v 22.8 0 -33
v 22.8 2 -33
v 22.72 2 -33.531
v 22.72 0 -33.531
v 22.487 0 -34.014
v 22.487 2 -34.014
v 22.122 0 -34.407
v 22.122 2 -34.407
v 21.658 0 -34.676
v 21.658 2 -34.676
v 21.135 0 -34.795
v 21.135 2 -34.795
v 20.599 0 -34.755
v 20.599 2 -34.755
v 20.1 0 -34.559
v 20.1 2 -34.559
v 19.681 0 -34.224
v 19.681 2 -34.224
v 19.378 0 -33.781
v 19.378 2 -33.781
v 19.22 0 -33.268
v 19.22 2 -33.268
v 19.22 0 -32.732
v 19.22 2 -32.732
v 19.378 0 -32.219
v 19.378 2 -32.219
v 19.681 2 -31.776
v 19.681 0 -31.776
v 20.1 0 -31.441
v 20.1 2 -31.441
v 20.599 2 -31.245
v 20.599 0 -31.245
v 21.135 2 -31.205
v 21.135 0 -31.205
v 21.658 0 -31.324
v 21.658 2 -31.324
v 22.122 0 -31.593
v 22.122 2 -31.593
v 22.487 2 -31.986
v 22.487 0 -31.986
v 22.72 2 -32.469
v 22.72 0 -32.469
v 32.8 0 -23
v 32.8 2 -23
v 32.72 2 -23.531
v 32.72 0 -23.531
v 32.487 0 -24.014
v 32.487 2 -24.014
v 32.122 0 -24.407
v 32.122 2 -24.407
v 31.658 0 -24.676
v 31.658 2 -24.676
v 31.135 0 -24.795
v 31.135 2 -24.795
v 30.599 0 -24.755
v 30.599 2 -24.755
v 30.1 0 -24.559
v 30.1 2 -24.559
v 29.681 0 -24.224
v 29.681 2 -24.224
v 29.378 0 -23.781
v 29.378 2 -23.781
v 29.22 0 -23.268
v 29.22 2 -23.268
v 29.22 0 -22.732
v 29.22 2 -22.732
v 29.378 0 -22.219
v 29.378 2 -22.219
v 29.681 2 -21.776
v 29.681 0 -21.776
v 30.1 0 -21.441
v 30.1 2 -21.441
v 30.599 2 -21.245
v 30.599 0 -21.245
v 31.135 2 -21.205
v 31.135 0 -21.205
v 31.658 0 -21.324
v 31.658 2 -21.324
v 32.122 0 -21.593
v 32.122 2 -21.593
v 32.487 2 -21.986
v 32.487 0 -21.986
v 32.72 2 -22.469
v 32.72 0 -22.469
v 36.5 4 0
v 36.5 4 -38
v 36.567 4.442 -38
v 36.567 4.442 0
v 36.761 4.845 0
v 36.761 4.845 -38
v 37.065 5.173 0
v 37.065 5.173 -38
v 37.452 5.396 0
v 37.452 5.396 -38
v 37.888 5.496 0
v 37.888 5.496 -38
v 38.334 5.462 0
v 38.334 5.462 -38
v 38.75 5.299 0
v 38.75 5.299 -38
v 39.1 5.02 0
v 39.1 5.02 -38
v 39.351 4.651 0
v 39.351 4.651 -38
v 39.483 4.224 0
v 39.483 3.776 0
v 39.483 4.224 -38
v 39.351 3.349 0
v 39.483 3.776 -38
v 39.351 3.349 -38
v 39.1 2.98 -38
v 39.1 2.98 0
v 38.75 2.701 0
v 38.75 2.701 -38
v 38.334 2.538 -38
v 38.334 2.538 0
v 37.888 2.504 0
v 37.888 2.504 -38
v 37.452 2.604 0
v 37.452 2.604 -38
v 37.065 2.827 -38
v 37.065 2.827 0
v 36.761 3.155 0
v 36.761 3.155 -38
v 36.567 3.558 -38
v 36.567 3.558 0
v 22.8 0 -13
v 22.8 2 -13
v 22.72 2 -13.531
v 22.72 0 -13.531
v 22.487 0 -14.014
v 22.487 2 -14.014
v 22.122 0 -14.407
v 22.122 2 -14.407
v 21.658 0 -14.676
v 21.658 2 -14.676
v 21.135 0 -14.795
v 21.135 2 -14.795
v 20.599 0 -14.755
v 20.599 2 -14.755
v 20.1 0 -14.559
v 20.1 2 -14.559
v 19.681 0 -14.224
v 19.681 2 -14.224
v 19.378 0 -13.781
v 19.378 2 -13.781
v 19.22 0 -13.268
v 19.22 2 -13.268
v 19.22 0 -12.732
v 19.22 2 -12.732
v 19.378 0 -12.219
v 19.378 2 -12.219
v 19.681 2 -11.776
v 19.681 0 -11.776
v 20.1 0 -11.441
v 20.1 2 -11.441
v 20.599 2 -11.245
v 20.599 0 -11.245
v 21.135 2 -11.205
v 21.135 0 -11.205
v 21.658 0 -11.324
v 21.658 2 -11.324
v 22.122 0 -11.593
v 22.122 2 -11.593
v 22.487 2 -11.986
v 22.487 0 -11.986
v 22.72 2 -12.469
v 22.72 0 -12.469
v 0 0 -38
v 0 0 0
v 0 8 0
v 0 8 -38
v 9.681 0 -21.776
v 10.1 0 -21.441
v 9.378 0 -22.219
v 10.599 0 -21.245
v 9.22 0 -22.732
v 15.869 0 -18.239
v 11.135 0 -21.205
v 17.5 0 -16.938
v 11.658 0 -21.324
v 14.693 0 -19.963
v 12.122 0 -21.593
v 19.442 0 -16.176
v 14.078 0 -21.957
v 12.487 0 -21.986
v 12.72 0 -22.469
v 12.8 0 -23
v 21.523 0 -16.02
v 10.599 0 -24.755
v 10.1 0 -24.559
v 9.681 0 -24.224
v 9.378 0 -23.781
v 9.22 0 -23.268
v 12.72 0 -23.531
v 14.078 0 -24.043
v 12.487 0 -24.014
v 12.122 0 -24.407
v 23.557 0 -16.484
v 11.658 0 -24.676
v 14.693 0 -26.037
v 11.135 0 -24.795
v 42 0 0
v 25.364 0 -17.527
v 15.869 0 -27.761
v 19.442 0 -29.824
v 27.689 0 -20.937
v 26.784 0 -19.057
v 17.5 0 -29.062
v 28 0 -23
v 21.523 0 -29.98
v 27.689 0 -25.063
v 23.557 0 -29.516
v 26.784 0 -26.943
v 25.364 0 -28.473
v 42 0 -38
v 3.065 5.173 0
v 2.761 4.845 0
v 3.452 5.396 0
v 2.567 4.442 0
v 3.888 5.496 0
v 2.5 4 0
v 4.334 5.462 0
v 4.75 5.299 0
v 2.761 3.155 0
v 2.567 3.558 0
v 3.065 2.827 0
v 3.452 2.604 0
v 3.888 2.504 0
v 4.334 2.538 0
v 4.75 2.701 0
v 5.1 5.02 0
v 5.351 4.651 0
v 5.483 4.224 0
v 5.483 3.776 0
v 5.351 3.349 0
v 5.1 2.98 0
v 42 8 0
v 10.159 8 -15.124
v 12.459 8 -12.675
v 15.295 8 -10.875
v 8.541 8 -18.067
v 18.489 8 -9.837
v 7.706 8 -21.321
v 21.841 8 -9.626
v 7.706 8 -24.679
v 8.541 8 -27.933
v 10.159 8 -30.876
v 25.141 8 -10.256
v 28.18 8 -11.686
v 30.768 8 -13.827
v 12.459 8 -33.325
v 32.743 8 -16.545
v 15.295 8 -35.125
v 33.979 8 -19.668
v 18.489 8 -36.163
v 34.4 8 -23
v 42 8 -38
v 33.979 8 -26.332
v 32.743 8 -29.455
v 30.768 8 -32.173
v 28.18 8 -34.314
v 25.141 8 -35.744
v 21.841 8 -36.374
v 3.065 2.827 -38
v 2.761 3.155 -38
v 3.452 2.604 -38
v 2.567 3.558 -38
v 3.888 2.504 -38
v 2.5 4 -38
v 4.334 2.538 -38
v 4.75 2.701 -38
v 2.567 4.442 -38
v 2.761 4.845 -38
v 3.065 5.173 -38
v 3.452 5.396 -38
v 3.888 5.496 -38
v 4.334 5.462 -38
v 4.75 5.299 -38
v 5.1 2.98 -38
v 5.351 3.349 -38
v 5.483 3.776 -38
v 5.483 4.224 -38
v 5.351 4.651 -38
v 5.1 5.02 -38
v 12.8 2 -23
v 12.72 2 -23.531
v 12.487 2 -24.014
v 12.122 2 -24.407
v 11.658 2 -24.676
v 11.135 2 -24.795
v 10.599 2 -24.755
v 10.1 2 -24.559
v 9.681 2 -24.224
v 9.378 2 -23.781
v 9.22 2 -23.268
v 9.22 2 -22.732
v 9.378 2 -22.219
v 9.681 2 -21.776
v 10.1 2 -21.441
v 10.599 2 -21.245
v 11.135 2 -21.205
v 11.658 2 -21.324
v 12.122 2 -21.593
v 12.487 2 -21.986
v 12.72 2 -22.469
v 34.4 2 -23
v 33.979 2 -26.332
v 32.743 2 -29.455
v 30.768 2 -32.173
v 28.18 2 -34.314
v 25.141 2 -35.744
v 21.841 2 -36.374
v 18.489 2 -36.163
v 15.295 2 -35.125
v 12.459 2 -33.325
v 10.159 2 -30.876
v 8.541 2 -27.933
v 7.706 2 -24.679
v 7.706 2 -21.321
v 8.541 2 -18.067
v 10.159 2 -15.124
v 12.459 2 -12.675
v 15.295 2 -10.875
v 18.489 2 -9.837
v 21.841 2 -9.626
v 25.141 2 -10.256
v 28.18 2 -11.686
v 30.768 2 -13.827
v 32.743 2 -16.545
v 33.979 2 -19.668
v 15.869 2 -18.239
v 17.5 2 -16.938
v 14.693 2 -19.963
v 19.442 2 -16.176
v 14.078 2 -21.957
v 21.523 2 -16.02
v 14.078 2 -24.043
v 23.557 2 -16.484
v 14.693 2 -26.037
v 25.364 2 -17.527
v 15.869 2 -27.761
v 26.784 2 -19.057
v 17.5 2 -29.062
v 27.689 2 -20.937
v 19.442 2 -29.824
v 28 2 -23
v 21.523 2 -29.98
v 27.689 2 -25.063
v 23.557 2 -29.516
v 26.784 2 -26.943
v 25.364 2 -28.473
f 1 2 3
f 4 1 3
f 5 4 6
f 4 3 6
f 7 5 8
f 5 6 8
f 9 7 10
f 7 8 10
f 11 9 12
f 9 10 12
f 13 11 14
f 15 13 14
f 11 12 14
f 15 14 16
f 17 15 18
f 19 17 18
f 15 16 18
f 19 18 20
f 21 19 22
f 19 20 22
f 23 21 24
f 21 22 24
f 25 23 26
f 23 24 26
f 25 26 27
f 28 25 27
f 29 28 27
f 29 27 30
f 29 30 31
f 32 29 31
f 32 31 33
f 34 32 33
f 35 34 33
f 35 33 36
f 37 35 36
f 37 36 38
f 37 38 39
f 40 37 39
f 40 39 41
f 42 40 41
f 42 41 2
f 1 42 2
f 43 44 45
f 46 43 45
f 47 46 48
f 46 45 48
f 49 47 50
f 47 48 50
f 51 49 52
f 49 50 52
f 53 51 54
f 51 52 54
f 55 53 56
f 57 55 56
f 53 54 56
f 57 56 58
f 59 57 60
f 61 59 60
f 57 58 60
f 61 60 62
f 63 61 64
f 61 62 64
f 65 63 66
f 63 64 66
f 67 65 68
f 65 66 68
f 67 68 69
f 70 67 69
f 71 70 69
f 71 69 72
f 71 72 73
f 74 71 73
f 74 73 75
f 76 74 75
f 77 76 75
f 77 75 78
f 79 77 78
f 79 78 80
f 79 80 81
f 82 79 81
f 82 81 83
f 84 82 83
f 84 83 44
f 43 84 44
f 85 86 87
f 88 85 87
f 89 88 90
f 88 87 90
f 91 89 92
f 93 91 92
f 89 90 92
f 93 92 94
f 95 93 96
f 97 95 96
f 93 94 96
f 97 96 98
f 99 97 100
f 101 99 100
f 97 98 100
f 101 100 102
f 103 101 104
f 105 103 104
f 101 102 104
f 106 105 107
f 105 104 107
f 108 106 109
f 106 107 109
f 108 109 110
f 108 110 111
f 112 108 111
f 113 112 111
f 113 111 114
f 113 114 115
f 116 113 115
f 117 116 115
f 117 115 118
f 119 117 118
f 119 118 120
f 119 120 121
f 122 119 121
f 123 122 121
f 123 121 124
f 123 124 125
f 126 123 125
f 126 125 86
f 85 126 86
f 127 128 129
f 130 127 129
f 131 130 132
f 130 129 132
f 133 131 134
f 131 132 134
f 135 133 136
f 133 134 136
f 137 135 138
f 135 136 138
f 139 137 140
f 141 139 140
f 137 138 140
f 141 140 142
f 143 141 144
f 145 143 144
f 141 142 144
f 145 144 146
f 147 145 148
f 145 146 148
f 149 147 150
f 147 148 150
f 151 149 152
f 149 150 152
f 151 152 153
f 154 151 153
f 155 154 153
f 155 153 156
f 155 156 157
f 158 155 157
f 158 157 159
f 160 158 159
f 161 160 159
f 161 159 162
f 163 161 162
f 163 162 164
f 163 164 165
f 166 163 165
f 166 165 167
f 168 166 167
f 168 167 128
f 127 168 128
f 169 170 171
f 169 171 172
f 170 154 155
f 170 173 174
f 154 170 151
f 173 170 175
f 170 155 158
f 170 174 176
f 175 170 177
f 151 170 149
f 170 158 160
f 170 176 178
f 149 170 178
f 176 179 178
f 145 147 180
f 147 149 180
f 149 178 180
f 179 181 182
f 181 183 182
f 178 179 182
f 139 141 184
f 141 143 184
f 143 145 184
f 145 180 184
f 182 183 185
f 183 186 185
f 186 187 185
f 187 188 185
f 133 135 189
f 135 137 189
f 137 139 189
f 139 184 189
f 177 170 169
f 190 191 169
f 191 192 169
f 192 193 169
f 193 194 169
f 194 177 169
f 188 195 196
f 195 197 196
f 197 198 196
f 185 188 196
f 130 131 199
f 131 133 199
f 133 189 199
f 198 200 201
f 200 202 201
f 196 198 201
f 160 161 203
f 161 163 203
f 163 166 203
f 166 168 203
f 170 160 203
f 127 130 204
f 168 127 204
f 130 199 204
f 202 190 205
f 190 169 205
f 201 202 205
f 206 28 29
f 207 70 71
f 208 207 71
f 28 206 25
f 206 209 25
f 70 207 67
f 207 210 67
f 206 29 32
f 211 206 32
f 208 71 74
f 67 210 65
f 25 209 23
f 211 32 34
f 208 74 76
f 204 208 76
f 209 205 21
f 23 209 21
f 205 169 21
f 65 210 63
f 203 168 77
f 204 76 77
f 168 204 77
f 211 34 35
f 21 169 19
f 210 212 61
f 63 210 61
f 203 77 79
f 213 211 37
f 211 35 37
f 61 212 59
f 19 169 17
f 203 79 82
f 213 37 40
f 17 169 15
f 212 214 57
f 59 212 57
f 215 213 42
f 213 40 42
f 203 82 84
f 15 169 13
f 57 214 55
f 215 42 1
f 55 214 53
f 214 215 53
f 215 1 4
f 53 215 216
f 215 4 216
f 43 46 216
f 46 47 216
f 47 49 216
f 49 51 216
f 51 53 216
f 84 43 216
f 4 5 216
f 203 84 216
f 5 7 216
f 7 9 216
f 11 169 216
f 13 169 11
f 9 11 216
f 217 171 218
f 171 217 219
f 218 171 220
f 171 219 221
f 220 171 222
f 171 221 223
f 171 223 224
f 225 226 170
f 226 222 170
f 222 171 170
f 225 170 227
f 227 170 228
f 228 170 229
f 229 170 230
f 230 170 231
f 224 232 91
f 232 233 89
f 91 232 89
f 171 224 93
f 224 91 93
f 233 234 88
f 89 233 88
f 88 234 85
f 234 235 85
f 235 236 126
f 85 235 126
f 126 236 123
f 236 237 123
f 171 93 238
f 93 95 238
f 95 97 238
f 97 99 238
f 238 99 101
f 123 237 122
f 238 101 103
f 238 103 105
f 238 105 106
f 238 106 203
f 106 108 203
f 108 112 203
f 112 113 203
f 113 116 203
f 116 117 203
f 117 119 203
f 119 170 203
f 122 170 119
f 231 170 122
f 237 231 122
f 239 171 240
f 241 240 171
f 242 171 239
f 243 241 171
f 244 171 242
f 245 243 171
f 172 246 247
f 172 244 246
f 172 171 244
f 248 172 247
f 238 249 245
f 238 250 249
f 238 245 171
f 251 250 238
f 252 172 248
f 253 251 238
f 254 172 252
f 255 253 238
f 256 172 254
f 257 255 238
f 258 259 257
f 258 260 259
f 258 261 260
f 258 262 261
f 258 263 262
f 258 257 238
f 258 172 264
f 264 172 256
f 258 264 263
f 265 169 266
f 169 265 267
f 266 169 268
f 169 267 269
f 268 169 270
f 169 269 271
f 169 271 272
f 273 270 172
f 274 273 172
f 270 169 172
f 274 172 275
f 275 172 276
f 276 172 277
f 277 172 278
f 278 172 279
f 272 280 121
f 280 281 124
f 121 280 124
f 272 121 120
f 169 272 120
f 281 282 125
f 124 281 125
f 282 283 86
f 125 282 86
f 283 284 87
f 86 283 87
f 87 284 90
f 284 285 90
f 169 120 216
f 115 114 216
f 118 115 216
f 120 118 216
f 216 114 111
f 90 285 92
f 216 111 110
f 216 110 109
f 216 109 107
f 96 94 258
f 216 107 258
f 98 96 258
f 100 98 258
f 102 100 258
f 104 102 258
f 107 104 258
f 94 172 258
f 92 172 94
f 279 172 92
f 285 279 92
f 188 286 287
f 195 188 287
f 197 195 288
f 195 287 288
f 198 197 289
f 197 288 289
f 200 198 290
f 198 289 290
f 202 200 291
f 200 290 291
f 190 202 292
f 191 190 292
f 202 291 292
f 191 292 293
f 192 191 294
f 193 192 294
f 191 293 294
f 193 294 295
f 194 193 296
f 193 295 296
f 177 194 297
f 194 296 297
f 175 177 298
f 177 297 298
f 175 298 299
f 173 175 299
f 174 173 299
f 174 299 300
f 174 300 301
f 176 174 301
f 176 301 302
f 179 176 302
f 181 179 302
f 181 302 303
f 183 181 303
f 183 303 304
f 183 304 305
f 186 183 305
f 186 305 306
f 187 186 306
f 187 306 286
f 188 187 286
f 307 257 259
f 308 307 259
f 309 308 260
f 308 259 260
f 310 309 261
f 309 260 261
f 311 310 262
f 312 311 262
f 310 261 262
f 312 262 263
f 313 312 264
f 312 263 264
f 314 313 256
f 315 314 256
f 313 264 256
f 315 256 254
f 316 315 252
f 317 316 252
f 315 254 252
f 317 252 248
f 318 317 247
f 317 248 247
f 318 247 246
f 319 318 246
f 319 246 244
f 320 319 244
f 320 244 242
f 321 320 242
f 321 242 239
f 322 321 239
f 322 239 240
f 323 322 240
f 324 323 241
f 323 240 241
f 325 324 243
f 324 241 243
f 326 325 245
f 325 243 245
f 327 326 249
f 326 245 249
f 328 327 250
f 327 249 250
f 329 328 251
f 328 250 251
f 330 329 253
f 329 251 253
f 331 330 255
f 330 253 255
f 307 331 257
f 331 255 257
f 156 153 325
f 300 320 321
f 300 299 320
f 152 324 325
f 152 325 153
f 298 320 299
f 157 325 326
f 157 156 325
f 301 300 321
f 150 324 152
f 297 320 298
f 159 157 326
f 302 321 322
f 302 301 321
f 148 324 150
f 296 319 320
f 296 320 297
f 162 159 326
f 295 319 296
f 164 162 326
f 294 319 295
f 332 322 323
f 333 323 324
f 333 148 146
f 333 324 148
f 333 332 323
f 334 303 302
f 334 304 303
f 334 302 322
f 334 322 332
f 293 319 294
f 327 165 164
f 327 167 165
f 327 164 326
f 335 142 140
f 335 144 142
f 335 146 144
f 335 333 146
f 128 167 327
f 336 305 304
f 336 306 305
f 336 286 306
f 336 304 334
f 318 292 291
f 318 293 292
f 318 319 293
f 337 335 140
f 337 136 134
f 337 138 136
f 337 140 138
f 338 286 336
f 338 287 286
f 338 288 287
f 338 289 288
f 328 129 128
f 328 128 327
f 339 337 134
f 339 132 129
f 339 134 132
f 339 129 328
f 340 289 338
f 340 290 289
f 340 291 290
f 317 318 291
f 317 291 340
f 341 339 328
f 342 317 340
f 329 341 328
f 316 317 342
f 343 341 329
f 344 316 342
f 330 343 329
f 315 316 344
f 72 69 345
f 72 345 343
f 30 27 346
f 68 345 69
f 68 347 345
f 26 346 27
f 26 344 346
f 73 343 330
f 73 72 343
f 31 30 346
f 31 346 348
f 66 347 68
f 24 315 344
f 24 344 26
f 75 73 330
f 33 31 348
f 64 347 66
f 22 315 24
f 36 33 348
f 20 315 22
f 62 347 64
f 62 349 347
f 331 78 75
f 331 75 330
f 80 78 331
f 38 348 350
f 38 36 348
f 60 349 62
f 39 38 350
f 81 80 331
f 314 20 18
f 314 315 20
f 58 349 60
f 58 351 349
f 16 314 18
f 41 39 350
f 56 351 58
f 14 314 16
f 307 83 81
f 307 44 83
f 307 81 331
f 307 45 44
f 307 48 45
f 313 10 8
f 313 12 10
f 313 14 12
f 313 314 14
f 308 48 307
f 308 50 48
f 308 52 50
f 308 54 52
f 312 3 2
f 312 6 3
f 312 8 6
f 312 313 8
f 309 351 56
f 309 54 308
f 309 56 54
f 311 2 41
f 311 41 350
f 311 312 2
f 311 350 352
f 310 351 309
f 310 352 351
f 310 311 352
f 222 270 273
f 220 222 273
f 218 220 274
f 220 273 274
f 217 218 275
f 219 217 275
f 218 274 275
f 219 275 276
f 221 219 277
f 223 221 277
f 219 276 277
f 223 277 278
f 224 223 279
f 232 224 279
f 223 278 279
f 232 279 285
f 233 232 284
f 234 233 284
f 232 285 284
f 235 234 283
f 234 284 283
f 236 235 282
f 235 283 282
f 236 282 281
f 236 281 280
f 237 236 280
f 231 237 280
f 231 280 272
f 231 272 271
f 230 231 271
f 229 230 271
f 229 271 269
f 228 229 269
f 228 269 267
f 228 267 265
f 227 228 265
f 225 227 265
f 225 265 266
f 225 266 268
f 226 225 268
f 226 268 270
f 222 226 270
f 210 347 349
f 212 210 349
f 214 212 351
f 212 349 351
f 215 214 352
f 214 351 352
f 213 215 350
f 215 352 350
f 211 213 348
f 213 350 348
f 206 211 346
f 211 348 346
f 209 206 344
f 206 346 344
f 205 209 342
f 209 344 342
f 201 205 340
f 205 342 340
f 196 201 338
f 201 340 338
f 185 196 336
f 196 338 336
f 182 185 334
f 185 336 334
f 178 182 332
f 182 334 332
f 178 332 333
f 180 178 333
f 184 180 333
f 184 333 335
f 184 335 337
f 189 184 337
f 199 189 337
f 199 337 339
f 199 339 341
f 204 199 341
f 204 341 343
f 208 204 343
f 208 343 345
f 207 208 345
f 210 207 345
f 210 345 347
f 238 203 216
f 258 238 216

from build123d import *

# Parameters (mm, degrees)
ESQUISSE1_W             = 42
ESQUISSE1_H             = 46
BOSS_EXTRU_1_DEPTH      = 8
ESQUISSE2_R             = 13.4
ENL_V_MAT_EXTRU_1_DEPTH = 6
ESQUISSE3_R             = 7
ESQUISSE3_R_2           = 1.8
ENL_V_MAT_EXTRU_2_DEPTH = 3
ESQUISSE4_R             = 1.5
ENL_V_MAT_EXTRU_3_DEPTH = 47
ENL_V_MAT_EXTRU_4_REACH = 10
ESQUISSE5_W             = 42
ESQUISSE5_H             = 8


with BuildPart() as part:
    # Esquisse1 → Boss.-Extru.1 (new body)
    with BuildSketch(Plane(origin=(0, 0, 0), x_dir=(1, 0, 0), z_dir=(0, 1, 0))):
        with Locations((21, 23)):
            Rectangle(ESQUISSE1_W, ESQUISSE1_H)
    extrude(amount=BOSS_EXTRU_1_DEPTH)

    # Esquisse2 → Enlèv. mat.-Extru.1 (cut)
    with BuildSketch(Plane(origin=(0, 8, 0), x_dir=(1, 0, 0), z_dir=(0, 1, 0))):
        with Locations((21, 23)):
            Circle(ESQUISSE2_R)
    extrude(amount=-ENL_V_MAT_EXTRU_1_DEPTH, mode=Mode.SUBTRACT)

    # Esquisse3 → Enlèv. mat.-Extru.2 (cut, through all)
    with BuildSketch(Plane(origin=(0, 2, 0), x_dir=(1, 0, 0), z_dir=(0, 1, 0))):
        with Locations((21, 23)):
            Circle(ESQUISSE3_R)
        with Locations((21, 33)):
            Circle(ESQUISSE3_R_2)
        with Locations((31, 23)):
            Circle(ESQUISSE3_R_2)
        with Locations((21, 13)):
            Circle(ESQUISSE3_R_2)
        with Locations((11, 23)):
            Circle(ESQUISSE3_R_2)
    extrude(amount=-ENL_V_MAT_EXTRU_2_DEPTH, mode=Mode.SUBTRACT)

    # Esquisse4 → Enlèv. mat.-Extru.3 (cut, through all)
    with BuildSketch(Plane(origin=(0, 0, -46), x_dir=(-1, 0, 0), z_dir=(0, 0, -1))):
        with Locations((-38, 4)):
            Circle(ESQUISSE4_R)
        with Locations((-4, 4)):
            Circle(ESQUISSE4_R)
    extrude(amount=-ENL_V_MAT_EXTRU_3_DEPTH, mode=Mode.SUBTRACT)

    # Esquisse5 → Enlèv. mat.-Extru.4 (cut, up to next)
    with BuildSketch(Plane(origin=(0, 8, 0), x_dir=(1, 0, 0), z_dir=(0, 1, 0)), mode=Mode.PRIVATE) as enl_v_mat_extru_4_sk1:
        with Locations((21, 42)):
            Rectangle(ESQUISSE5_W, ESQUISSE5_H)
    enl_v_mat_extru_4_tool1 = extrude(enl_v_mat_extru_4_sk1.sketch, amount=-ENL_V_MAT_EXTRU_4_REACH, mode=Mode.PRIVATE) & part.part
    add(enl_v_mat_extru_4_tool1.solids().sort_by_distance((21, 8, -42))[0], mode=Mode.SUBTRACT)


solid = part.part
